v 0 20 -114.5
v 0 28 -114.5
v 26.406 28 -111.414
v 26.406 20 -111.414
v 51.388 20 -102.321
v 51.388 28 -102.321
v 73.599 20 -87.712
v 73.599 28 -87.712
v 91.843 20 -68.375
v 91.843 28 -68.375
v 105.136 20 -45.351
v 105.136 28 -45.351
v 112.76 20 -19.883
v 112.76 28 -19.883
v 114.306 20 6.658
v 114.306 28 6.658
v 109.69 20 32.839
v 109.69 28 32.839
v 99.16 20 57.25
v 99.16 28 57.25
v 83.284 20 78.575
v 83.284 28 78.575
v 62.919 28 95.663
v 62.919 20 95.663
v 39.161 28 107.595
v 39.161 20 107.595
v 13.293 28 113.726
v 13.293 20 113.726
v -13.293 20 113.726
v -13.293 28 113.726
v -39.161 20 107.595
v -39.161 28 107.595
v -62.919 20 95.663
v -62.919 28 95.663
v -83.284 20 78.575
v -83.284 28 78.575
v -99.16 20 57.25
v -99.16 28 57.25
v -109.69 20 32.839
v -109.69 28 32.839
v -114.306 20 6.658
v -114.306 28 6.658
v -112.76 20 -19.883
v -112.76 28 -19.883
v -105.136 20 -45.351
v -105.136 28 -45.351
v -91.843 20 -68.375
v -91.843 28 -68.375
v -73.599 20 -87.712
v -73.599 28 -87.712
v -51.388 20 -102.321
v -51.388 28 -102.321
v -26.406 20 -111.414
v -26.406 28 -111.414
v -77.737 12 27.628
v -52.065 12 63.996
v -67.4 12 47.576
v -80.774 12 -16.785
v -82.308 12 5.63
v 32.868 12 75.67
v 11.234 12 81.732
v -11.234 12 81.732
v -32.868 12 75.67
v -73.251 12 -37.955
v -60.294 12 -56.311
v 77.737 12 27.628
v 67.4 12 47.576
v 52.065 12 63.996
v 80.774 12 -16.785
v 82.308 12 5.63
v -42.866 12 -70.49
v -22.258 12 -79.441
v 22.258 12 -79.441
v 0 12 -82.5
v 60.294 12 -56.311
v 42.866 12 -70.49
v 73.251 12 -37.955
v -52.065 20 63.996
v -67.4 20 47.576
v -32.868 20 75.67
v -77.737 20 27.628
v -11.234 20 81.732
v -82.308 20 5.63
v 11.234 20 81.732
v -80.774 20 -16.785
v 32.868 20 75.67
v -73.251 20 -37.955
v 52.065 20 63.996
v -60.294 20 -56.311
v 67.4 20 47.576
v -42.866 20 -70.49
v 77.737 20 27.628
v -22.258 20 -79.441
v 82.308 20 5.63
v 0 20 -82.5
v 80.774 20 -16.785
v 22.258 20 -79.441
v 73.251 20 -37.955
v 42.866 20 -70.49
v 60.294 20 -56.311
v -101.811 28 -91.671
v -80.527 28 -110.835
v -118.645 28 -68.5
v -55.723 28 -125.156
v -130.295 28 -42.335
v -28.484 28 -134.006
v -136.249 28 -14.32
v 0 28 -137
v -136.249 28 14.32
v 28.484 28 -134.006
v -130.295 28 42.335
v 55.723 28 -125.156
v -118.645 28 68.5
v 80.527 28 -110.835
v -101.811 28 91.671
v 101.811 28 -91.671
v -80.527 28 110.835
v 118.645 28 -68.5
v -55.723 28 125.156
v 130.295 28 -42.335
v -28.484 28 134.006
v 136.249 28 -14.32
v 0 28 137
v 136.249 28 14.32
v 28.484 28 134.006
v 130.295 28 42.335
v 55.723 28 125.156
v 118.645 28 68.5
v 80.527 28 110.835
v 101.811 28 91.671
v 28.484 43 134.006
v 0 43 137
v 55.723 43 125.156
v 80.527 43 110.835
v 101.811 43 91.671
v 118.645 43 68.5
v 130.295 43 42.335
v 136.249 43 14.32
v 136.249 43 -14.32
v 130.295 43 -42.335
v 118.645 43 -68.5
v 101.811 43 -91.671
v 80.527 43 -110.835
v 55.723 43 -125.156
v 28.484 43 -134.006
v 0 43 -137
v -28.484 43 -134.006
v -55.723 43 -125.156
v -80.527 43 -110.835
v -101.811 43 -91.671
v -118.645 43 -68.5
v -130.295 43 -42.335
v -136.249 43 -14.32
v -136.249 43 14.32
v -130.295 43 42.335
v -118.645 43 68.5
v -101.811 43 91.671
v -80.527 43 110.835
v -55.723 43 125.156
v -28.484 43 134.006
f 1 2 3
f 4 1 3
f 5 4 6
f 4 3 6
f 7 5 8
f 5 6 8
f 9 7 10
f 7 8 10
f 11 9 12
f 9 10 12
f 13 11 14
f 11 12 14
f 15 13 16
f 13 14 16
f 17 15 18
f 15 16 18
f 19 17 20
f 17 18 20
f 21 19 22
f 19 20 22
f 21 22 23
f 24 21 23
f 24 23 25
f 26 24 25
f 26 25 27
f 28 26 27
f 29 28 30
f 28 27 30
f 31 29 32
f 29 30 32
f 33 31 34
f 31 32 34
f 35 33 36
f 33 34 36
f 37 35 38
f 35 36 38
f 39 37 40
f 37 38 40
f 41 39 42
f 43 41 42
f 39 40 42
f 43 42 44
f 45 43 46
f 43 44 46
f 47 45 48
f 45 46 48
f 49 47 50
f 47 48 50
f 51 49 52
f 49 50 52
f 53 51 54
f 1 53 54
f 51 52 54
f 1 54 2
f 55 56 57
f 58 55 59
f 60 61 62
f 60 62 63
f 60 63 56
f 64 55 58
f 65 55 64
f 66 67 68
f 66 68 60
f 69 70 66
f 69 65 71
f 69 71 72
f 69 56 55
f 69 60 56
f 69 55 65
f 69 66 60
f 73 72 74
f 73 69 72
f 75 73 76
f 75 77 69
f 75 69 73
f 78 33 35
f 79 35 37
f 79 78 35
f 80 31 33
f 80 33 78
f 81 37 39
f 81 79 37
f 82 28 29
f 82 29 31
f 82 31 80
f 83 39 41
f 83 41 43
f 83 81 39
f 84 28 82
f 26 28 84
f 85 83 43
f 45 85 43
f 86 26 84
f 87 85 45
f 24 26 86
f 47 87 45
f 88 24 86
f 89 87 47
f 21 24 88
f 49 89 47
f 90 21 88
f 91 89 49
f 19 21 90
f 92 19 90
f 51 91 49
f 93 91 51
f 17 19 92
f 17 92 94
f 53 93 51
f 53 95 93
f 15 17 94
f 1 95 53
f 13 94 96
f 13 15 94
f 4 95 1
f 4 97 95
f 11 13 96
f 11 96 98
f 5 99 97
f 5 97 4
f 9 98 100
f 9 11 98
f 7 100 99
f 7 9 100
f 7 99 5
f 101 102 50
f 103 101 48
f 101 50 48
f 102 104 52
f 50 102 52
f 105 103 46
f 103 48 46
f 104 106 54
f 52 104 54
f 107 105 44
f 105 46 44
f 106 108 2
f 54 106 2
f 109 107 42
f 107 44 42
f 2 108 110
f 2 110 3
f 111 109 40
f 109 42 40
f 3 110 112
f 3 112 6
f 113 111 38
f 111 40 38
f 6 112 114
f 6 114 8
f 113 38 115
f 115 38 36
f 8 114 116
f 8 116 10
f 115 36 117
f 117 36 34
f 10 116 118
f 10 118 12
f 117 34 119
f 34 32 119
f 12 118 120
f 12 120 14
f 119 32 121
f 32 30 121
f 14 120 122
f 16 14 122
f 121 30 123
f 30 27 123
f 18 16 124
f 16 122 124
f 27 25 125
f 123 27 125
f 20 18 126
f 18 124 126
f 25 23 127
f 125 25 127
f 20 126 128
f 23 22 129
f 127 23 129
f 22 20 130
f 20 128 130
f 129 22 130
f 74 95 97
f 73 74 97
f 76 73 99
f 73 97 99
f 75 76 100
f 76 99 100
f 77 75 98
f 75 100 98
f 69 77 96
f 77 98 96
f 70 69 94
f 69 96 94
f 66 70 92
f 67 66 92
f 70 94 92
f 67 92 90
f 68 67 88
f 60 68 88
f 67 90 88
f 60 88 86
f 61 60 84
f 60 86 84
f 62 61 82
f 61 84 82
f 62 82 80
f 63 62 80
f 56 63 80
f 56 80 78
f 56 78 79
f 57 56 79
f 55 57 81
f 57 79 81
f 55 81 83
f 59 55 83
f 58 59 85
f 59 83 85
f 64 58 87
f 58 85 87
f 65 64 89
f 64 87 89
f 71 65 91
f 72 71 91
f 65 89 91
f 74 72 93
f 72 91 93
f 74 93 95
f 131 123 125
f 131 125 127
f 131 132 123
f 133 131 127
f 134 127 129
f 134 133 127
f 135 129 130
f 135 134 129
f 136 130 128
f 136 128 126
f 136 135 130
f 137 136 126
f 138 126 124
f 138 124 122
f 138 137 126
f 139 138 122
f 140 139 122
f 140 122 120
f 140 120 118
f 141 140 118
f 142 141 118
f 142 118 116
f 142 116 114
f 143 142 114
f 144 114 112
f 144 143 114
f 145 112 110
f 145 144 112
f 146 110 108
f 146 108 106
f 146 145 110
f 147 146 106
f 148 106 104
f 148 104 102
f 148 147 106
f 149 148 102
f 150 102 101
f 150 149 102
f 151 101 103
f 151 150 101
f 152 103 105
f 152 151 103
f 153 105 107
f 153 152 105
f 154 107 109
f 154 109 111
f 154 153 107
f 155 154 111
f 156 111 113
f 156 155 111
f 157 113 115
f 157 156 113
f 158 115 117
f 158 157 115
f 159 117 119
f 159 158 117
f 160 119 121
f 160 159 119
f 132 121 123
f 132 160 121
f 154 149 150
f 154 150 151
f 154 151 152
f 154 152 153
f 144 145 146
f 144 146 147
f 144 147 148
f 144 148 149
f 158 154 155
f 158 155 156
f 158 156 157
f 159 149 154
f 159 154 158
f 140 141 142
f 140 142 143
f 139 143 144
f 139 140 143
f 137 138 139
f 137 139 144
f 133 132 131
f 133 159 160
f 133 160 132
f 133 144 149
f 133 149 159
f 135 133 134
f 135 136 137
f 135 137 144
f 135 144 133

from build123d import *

# Parameters (mm, degrees)
SKETCH_1_W      = 137
SKETCH_1_H      = 15
SKETCH_2_R      = 114.5
EXTRUDE_1_DEPTH = 8
SKETCH_3_R      = 82.5
EXTRUDE_2_DEPTH = 8


with BuildPart() as part:
    # 草圖1 → 旋轉1 (revolve)
    with BuildSketch(Plane(origin=(0, 0, 0), x_dir=(-1, 0, 0), z_dir=(0, 0, -1)), mode=Mode.PRIVATE) as revolve_1_sk:
        with Locations((-68.5, 35.5)):
            Rectangle(SKETCH_1_W, SKETCH_1_H)
    revolve(revolve_1_sk.sketch.rotate(Axis((0, 28, 0), (0, 1, 0)), 270), axis=Axis((0, 28, 0), (0, 1, 0)))

    # 草圖2 → 填料-伸長1 (add)
    with BuildSketch(Plane.XZ.offset(-28)):
        with Locations(Location((0, 0, 0), (0, 0, 270))):
            Circle(SKETCH_2_R)
    extrude(amount=EXTRUDE_1_DEPTH)

    # 草圖3 → 填料-伸長2 (add)
    with BuildSketch(Plane.XZ.offset(-20)):
        with Locations(Location((0, 0, 0), (0, 0, 270))):
            Circle(SKETCH_3_R)
    extrude(amount=EXTRUDE_2_DEPTH)


solid = part.part
